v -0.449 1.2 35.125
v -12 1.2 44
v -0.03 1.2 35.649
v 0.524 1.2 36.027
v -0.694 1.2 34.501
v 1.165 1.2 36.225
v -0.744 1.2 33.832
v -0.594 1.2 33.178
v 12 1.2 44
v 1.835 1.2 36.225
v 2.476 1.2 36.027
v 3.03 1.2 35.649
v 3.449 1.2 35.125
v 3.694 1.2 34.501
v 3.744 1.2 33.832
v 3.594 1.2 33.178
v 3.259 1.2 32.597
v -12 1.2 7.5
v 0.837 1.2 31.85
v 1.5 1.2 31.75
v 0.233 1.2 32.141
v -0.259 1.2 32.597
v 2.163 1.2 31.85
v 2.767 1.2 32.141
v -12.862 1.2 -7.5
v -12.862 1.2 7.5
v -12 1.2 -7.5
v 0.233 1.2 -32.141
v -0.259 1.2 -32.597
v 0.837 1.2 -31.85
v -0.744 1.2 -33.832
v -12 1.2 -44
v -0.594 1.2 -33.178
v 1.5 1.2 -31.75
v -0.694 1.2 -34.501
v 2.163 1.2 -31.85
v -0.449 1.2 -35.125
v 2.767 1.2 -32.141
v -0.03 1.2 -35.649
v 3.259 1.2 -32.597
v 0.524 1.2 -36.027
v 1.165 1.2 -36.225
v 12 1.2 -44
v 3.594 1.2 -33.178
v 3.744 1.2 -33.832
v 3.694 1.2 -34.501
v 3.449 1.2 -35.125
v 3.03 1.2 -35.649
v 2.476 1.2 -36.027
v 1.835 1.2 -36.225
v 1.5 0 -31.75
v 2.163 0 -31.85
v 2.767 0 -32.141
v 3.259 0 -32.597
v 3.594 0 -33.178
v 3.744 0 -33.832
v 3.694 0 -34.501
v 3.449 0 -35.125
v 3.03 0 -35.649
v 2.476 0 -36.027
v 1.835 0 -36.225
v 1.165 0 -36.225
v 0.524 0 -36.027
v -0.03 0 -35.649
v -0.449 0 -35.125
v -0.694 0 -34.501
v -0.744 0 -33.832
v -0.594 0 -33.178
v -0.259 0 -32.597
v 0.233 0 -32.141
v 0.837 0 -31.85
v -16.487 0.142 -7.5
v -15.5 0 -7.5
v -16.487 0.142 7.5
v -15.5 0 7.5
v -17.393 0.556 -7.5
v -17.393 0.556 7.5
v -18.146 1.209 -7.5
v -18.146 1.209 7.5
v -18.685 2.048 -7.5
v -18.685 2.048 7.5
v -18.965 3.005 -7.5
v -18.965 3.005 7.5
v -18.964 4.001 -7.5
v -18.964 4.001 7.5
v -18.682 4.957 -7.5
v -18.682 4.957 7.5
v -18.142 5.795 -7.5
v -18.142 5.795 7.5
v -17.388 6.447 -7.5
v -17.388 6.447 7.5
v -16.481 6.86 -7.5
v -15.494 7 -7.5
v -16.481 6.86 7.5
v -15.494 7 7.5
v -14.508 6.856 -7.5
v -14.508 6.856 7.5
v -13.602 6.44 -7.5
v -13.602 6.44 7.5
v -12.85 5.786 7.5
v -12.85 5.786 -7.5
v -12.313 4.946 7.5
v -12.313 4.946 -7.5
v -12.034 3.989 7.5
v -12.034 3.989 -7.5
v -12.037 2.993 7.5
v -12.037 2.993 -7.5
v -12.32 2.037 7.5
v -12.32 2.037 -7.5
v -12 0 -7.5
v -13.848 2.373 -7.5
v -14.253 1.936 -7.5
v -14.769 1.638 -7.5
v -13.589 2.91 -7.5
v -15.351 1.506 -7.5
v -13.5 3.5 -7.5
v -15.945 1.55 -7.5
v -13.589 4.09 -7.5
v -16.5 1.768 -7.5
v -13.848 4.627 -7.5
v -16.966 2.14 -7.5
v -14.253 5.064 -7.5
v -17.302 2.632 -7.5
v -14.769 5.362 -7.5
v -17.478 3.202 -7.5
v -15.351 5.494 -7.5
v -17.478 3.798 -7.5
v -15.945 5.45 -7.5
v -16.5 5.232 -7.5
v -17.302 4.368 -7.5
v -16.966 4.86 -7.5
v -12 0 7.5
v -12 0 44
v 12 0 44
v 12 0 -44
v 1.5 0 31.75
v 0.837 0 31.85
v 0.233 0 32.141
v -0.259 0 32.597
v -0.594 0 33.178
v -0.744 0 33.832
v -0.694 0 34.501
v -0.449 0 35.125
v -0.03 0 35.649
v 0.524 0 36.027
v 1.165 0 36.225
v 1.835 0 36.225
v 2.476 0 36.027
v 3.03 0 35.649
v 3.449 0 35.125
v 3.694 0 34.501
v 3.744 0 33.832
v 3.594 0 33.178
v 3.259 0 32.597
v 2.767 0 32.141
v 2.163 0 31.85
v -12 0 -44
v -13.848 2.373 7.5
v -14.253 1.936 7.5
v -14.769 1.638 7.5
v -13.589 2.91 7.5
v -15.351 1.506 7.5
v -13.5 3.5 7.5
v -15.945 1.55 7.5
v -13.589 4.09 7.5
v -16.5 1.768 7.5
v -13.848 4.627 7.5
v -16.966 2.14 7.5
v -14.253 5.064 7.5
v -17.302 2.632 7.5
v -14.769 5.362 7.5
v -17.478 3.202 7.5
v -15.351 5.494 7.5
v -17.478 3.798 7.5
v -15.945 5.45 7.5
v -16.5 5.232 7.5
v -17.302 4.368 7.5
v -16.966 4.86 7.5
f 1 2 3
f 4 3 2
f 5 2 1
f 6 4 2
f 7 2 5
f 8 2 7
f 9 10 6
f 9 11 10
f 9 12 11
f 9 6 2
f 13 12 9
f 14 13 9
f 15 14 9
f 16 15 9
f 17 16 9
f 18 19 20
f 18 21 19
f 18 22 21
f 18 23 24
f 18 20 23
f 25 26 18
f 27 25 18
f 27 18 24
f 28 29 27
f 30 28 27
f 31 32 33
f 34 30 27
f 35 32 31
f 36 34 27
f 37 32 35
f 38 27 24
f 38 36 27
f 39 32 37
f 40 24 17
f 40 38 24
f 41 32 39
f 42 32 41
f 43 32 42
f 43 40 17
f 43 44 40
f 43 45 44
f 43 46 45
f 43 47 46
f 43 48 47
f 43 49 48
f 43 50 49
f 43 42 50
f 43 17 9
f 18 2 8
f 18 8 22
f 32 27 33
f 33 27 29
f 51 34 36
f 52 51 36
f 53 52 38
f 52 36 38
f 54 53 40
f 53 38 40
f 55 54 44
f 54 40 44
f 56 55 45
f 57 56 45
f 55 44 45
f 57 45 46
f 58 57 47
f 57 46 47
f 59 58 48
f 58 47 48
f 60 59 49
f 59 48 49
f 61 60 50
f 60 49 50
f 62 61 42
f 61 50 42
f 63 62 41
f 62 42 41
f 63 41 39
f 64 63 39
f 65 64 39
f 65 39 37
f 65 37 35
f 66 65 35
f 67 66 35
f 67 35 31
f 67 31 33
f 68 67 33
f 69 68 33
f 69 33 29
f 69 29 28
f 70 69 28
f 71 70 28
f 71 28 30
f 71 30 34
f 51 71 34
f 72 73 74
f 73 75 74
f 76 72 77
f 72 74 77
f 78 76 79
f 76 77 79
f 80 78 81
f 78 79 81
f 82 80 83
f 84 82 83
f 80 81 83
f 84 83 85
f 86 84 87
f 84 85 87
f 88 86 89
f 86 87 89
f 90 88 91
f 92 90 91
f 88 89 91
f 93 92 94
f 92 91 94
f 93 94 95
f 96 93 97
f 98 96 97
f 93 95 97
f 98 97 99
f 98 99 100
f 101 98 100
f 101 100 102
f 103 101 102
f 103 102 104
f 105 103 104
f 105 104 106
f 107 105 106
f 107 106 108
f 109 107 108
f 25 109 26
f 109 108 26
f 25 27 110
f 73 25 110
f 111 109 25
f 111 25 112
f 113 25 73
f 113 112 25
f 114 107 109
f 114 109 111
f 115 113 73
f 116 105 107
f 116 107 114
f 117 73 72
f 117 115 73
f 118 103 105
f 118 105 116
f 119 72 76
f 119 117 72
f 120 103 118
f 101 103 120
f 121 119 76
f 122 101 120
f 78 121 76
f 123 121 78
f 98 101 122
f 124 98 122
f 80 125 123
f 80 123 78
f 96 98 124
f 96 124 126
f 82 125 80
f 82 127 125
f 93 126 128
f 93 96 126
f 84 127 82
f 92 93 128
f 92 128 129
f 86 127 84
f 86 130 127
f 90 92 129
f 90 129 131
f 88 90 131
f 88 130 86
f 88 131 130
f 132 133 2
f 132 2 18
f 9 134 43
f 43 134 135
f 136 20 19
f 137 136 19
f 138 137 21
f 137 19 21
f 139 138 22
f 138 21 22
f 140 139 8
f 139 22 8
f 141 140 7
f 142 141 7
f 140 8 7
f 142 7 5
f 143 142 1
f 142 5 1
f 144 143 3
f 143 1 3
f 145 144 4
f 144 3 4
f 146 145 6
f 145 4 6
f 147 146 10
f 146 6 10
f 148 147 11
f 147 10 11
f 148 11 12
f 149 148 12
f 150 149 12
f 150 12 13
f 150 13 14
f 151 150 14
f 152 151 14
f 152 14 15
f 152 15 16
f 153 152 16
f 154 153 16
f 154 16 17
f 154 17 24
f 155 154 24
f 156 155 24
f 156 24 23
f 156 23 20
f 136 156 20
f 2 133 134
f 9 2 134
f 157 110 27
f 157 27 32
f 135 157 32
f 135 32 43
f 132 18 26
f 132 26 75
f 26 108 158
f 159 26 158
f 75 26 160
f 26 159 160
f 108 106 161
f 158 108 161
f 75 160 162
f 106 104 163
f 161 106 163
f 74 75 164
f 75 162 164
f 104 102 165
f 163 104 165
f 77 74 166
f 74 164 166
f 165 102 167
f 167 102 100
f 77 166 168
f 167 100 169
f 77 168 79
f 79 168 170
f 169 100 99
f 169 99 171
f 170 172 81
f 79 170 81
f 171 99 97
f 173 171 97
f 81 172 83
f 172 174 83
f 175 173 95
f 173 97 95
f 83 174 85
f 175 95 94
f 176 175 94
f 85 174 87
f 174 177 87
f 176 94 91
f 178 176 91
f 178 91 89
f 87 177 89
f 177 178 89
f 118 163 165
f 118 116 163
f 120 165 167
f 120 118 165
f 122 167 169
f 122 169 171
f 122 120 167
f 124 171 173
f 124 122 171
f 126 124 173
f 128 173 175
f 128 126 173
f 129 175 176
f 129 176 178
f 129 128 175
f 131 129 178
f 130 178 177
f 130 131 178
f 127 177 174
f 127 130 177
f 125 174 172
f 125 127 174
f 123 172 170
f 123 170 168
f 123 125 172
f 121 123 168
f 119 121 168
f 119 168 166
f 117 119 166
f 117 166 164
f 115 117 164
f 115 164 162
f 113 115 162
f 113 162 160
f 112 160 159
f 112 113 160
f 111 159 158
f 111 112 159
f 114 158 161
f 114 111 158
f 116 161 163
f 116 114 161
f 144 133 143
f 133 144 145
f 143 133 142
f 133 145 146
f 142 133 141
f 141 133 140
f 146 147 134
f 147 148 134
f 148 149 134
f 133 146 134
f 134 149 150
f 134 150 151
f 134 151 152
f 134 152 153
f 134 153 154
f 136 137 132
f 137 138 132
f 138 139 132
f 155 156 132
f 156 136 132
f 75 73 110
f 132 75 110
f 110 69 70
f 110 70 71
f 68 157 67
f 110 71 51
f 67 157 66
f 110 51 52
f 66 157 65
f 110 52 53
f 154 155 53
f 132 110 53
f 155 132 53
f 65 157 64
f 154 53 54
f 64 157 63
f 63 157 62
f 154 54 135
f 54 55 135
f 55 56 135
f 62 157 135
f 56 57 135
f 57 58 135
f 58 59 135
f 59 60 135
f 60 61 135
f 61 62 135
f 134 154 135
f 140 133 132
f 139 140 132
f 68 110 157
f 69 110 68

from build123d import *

# Parameters (mm, degrees)
SKETCH1_W           = 24
SKETCH1_H           = 88
BOSS_EXTRUDE1_DEPTH = 1.2
SKETCH2_R           = 2
BOSS_EXTRUDE2_DEPTH = 7.5
SKETCH4_R           = 2.25
CUT_EXTRUDE2_DEPTH  = 49.276702456


with BuildPart() as part:
    # Sketch1 → Boss-Extrude1 (new body)
    with BuildSketch(Plane(origin=(0, 0, 0), x_dir=(1, 0, 0), z_dir=(0, 1, 0))):
        Rectangle(SKETCH1_W, SKETCH1_H)
    extrude(amount=BOSS_EXTRUDE1_DEPTH)

    # Sketch2 → Boss-Extrude2 (add, symmetric)
    with BuildSketch(Plane.XY):
        with BuildLine():
            Line((-12, 0), (-15.5, 0))
            ThreePointArc((-15.5, 0), (-16.949137675, 6.685906464), (-12.861818808, 1.2))
            Line((-12.861818808, 1.2), (-12, 1.2))
            Line((-12, 1.2), (-12, 0))
        make_face()
        with Locations((-15.5, 3.5)):
            Circle(SKETCH2_R, mode=Mode.SUBTRACT)
    extrude(amount=BOSS_EXTRUDE2_DEPTH, both=True)

    # Sketch4 → Cut-Extrude2 (cut, through all)
    with BuildSketch(Plane(origin=(0, 1.2, 0), x_dir=(1, 0, 0), z_dir=(0, 1, 0))):
        with Locations(Location((1.5, 34, 0), (0, 0, 270))):
            Circle(SKETCH4_R)
        with Locations(Location((1.5, -34, 0), (0, 0, 90))):
            Circle(SKETCH4_R)
    extrude(amount=-CUT_EXTRUDE2_DEPTH, mode=Mode.SUBTRACT)


solid = part.part
